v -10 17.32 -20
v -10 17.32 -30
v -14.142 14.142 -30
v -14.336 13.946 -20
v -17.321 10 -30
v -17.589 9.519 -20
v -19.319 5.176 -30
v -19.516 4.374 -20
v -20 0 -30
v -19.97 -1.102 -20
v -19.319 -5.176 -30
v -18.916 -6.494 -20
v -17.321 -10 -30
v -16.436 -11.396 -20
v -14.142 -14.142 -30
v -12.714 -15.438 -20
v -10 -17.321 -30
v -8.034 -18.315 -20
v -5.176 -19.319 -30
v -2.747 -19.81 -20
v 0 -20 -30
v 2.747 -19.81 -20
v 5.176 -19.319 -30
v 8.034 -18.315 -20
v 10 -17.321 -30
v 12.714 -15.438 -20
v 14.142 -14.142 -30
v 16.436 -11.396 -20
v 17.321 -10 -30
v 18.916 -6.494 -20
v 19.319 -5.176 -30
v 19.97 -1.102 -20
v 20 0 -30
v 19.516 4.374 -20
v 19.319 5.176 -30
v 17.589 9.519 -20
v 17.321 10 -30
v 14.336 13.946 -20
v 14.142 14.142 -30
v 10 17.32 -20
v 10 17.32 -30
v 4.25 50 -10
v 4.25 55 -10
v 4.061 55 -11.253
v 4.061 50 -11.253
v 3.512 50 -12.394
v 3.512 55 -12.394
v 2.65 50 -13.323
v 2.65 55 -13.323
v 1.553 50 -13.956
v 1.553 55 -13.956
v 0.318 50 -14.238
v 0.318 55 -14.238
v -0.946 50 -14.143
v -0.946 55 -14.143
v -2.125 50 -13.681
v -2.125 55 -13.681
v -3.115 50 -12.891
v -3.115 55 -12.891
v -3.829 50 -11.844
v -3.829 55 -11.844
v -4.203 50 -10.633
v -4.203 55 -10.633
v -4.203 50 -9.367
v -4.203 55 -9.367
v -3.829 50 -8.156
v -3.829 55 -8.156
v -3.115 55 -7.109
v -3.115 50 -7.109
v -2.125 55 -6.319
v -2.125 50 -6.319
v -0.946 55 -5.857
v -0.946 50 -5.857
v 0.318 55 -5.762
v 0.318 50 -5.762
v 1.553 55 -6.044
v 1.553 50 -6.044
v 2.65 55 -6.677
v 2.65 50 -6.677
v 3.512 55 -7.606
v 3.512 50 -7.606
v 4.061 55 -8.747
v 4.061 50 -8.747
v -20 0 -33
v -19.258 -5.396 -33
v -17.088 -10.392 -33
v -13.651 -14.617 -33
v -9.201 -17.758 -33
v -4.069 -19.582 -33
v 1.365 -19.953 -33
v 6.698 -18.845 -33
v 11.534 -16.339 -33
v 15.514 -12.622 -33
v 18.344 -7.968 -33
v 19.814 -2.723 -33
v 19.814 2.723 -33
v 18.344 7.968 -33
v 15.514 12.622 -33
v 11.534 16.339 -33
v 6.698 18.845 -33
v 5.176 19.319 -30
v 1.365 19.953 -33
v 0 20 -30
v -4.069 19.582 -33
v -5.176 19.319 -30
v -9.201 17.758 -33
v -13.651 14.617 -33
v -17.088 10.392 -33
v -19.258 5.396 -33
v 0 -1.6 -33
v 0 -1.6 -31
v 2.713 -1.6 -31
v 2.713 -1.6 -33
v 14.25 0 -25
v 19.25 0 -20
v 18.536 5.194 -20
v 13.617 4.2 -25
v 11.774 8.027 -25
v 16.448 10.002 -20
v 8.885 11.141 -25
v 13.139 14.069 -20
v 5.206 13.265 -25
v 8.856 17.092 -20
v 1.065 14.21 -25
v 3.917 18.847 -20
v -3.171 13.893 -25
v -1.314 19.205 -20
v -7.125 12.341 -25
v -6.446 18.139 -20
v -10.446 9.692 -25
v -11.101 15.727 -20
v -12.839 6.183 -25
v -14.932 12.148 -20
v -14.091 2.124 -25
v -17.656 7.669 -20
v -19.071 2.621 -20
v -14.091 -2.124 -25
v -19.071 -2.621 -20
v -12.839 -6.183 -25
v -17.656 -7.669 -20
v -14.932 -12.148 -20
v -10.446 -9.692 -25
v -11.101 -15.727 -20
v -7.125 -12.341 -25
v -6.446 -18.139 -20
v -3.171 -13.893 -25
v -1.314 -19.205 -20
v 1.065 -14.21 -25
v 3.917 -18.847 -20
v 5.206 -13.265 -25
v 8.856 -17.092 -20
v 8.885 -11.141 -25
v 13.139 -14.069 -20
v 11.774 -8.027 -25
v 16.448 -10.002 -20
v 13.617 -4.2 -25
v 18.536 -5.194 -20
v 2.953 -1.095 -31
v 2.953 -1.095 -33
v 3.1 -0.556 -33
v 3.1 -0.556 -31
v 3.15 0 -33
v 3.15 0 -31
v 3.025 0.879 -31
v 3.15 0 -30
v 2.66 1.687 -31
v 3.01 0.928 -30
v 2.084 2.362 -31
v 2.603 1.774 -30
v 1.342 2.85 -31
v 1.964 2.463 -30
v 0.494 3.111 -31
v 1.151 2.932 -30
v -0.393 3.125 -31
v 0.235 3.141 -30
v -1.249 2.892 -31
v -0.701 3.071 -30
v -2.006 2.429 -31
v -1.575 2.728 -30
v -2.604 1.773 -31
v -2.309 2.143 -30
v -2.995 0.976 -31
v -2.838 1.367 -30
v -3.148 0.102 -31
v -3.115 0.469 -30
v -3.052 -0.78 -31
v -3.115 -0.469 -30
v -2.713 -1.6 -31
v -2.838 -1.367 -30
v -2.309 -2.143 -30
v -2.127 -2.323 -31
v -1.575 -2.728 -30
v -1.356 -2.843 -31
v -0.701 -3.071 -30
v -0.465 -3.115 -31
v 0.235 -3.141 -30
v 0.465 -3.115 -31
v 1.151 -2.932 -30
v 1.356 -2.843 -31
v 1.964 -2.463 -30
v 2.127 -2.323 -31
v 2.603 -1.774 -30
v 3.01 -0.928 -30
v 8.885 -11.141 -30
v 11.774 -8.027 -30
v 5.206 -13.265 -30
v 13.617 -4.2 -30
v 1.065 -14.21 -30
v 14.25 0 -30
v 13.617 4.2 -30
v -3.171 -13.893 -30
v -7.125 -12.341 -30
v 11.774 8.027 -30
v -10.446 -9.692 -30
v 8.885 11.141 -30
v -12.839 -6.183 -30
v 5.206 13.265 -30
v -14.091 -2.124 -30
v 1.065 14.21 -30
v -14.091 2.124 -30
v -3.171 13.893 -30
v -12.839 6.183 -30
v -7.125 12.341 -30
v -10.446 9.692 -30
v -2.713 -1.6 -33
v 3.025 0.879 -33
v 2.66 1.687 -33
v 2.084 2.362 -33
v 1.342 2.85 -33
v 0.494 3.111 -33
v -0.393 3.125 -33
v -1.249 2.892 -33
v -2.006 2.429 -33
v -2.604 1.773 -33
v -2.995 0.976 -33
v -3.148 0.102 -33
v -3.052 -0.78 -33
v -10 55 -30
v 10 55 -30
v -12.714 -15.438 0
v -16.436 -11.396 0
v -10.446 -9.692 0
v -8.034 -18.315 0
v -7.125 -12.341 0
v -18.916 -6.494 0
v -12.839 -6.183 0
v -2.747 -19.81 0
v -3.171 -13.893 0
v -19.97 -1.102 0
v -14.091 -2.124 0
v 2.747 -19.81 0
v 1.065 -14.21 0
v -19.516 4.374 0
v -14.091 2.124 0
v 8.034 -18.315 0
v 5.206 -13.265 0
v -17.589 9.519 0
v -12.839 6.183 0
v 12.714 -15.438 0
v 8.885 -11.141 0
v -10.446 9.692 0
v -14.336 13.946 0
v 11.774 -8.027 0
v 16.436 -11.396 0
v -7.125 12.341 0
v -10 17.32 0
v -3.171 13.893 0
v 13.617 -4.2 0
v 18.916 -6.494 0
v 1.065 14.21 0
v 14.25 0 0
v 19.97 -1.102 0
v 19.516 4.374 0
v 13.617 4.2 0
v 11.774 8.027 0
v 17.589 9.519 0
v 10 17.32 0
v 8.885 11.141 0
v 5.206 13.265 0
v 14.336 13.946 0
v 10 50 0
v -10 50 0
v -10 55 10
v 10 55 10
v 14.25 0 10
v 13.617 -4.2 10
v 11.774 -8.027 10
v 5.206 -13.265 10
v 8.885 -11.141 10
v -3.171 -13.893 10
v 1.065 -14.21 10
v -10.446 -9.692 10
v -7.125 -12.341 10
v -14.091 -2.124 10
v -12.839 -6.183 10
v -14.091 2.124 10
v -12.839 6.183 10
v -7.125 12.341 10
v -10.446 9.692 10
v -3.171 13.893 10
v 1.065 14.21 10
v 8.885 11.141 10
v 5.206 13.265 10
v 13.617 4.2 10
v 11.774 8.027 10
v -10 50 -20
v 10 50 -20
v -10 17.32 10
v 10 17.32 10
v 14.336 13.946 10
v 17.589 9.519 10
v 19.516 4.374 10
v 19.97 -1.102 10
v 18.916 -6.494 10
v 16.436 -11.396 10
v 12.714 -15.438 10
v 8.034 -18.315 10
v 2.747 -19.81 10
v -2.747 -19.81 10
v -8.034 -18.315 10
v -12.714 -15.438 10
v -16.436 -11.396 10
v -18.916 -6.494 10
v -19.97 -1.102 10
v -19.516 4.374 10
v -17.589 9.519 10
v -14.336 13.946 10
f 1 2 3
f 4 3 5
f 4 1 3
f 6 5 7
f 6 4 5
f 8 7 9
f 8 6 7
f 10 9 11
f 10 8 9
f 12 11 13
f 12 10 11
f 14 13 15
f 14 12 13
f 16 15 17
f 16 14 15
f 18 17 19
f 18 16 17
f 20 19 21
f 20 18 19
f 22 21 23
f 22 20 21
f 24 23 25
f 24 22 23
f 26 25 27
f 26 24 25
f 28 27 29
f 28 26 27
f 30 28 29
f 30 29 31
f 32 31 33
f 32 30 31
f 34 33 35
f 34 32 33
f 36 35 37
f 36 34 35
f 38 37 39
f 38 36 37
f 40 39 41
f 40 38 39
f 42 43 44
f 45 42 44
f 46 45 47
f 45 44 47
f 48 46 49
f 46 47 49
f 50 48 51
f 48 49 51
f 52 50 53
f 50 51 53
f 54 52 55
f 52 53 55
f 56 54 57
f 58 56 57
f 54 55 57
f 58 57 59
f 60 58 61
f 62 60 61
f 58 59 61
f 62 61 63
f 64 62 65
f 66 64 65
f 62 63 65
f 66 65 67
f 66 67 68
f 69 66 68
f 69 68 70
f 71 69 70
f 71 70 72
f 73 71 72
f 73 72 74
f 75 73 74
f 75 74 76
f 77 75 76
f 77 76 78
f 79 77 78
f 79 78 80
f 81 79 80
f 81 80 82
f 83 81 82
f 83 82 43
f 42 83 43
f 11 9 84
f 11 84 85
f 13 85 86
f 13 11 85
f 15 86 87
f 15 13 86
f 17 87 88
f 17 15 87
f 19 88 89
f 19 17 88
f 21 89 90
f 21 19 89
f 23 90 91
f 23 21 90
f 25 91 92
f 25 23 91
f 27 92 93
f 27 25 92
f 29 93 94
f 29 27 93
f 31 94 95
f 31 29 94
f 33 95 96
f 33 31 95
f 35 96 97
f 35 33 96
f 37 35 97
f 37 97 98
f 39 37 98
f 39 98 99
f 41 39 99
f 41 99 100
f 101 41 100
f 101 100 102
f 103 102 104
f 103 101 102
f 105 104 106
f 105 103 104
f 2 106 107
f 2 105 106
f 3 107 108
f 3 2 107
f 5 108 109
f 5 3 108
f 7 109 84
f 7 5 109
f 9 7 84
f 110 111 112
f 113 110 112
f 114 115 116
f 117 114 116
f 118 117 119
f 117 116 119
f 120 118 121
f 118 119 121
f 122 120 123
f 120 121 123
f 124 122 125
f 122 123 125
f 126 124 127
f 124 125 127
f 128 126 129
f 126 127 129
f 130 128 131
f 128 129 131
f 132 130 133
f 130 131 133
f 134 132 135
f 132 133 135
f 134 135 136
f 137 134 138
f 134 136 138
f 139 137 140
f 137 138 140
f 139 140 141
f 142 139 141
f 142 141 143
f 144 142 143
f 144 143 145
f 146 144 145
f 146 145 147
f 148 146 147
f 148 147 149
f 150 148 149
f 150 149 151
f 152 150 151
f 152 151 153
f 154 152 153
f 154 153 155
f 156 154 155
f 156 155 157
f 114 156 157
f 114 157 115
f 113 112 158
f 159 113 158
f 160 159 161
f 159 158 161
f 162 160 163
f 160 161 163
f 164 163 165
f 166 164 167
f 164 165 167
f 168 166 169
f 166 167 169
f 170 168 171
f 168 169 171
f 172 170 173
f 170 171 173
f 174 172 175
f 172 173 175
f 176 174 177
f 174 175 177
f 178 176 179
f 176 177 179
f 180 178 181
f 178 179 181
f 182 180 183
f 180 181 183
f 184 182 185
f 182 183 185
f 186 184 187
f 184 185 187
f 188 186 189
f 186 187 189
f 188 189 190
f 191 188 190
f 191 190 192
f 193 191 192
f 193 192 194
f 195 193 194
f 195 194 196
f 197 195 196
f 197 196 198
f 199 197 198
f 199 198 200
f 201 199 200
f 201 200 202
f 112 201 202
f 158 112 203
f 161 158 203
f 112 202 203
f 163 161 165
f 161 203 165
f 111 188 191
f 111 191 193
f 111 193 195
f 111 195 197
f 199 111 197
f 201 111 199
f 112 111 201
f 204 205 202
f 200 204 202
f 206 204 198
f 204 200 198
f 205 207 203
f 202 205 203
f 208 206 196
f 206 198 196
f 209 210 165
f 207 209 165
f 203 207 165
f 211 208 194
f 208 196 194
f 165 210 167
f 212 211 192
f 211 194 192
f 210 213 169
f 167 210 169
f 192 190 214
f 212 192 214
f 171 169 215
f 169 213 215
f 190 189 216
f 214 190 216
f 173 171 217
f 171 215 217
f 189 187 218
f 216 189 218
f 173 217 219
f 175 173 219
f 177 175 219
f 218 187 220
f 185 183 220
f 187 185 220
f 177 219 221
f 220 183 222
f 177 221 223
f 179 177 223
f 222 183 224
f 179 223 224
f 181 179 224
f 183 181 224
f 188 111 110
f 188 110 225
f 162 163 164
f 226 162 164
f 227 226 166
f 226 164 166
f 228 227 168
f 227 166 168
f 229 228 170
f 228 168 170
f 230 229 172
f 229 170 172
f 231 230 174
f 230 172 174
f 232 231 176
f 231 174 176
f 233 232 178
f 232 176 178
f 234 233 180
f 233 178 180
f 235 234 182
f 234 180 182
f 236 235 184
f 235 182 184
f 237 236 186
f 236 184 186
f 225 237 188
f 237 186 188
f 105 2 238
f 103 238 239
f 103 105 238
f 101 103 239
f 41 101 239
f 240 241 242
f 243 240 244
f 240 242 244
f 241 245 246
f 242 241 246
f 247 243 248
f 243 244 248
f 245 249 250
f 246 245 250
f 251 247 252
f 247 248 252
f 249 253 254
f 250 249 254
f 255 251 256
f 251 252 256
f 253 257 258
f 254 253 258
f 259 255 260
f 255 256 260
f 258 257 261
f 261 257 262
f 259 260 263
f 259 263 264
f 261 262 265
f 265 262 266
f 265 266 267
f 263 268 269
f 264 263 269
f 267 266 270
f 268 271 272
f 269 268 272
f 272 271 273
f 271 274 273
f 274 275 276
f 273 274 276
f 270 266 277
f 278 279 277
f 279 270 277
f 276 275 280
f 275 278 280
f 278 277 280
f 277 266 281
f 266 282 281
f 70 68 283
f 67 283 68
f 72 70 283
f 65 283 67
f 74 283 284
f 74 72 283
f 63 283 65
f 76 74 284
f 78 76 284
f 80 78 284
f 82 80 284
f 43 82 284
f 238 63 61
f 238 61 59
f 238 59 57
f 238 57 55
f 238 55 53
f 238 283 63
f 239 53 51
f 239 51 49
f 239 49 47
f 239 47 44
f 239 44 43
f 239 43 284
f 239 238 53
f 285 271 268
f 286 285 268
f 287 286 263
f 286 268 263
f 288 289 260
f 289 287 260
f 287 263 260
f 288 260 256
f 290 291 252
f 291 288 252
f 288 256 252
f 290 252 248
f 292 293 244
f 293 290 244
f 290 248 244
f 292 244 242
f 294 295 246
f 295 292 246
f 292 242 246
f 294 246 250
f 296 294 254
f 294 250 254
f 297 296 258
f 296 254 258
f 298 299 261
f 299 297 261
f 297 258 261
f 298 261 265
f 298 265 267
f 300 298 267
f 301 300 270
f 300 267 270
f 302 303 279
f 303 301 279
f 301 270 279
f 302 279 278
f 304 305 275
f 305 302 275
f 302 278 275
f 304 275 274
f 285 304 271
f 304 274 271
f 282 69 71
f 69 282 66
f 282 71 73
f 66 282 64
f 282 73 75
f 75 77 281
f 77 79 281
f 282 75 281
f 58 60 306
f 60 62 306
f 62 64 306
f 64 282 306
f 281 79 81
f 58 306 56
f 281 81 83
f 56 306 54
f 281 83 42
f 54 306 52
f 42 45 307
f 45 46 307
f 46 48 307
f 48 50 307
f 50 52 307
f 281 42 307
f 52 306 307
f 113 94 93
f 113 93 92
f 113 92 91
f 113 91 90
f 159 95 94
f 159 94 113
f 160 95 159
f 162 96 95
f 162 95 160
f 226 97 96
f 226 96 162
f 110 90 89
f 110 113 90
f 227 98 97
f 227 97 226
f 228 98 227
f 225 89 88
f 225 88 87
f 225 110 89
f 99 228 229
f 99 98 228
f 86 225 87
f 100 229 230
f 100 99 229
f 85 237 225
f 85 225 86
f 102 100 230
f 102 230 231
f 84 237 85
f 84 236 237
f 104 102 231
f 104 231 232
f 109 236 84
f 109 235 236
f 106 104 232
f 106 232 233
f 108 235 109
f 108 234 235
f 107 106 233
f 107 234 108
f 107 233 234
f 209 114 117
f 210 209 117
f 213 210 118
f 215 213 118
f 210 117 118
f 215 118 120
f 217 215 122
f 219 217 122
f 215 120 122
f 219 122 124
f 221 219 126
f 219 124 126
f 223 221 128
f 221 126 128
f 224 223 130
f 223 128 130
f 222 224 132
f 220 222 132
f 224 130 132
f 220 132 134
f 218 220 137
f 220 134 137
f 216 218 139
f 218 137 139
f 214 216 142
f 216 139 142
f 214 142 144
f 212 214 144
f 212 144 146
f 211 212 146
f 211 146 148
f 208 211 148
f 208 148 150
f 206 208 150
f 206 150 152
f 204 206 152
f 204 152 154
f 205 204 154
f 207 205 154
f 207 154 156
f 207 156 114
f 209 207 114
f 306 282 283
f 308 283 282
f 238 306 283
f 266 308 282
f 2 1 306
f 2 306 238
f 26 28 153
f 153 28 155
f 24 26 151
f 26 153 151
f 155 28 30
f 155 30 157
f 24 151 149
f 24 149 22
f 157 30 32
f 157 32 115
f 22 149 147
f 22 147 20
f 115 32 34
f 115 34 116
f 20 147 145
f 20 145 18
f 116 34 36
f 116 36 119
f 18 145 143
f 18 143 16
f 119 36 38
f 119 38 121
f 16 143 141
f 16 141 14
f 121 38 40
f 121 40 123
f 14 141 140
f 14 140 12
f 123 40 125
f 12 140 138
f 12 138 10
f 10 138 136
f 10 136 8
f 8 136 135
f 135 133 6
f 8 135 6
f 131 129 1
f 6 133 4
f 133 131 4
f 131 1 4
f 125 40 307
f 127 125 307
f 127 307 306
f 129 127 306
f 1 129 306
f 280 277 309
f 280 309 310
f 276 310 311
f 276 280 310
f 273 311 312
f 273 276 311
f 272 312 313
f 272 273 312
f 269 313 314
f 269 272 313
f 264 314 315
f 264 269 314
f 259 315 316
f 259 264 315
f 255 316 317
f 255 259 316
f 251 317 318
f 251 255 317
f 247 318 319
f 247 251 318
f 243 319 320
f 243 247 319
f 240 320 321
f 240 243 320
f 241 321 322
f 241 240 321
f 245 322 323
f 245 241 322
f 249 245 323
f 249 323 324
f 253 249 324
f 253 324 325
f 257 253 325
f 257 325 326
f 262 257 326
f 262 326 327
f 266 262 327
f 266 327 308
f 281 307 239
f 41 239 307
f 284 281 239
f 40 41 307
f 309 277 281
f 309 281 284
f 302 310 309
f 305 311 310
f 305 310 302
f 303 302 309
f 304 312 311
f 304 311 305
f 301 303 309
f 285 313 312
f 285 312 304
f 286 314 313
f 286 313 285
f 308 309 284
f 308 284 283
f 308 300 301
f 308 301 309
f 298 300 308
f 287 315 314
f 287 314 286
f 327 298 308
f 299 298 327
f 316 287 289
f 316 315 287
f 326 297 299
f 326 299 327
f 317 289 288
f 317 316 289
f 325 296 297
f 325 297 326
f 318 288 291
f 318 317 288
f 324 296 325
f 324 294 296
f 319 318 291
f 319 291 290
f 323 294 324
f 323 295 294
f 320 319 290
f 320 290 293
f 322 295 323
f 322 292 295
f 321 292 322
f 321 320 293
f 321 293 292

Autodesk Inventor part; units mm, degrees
ref_plane "YZ Plane" through (0, 0, 0) normal (1, 0, 0) x (0, 1, 0)
ref_plane "XZ Plane" through (0, 0, 0) normal (0, 1, 0) x (-1, 0, 0)
ref_plane "XY Plane" through (0, 0, 0) normal (0, 0, 1) x (1, 0, 0)
sketch "Sketch1" plane through (0, 0, 0) normal (0, 0, 1) x (1, 0, 0)
  circle A0 centre (0, 0) radius 14.25
  circle A1 centre (0, 0) radius 20
  line L0 (0, 50) -> (10, 50)
  line L1 (10, 50) -> (10, 17.3205)
  line L2 (0, 20) -> (0, 50)
  line L3 (0, 50) -> (-10, 50)
  line L4 (-10, 50) -> (-10, 17.3205)
  point P0 (-20, 0)
  point P1 (20, 0)
  dimension "d0" = 28.5
  dimension "d1" = 40
  dimension "d25" = 10
  dimension "d31" = 10
extrude "Extrusion1" add sketch "Sketch1" along normal blind 10
ref_plane "Work Plane1" through (0, 0, -10) normal (0, 0, 1) x (1, 0, 0)
mirror "Mirror1" about plane through (0, 0, -10) normal (0, 0, 1) of "Extrusion1"
sketch "Sketch2" plane through (0, 0, -30) normal (0, 0, -1) x (-1, 0, 0)
  circle A0 centre (0, 0) radius 14.25 projected
  circle A1 centre (0, 0) radius 20
  dimension "d11" = 40
extrude "Extrusion2" add sketch "Sketch2" along normal blind 3 contours A0 | A1
sketch "Sketch3" plane through (0, 0, -30) normal (0, 0, 1) x (1, 0, 0)
  circle A0 centre (0, 0) radius 3.15
  dimension "d14" = 6.3
extrude "Extrusion3" cut sketch "Sketch3" against normal blind 1
sketch "Sketch4" plane through (0, 0, -31) normal (0, 0, 1) x (1, 0, 0)
  circle A0 centre (0, 0) radius 3.15
  line L0 (0, 0) -> (0, -1.6)
  line L1 (0, -1.6) -> (-2.7134, -1.6)
  line L2 (0, -1.6) -> (2.7134, -1.6)
  dimension "d17" = 6.3
  dimension "d18" = 1.6
extrude "Extrusion4" cut sketch "Sketch4" against normal through all contours A0 L2 L1 picked at (-0.0447, 1.5505)
sketch "Sketch6" plane through (-7.5, 50, -22) normal (0, 1, 0) x (1, 0, 0)
  line L0 (17.5, 8) -> (17.5, 8) projected
  line L1 (17.5, -22) -> (17.5, -32) projected
  line L2 (-2.5, 8) -> (17.5, 8)
  line L3 (17.5, 8) -> (17.5, -32)
  line L4 (17.5, -32) -> (-2.5, -32)
  line L5 (-2.5, -32) -> (-2.5, 8)
  point P0 (7.5, -22)
extrude "Extrusion6" add sketch "Sketch6" along normal blind 5
sketch "Sketch7" plane through (-7.5, 55, -22) normal (0, 1, 0) x (1, 0, 0)
  line L0 (21.75, -32) -> (-6.75, -32) projected
  line L1 (7.5, -32) -> (7.5, 8)
  line L2 (10.65, 8) -> (4.35, 8) projected
  circle A0 centre (7.5, -12) radius 4.25
  point P0 (7.5, -22)
  dimension "d28" = 8.5
extrude "Extrusion7" cut sketch "Sketch7" against normal up to next
chamfer "Chamfer1" distance 5 angle 45 1 edges at (-14.25, 0, -20)
equation "\"d4\" = d25"
equation "\"BendRadius\" = Thickness"
equation "\"BendReliefWidth\" = Thickness"
equation "\"BendReliefDepth\" = 0.5 * Thickness"
equation "\"CornerReliefSize\" = 4 * Thickness"
equation "\"MinimumRemnant\" = 2 * Thickness"
equation "\"TransitionRadius\" = BendRadius"
equation "\"JacobiRadiusSize\" = BendRadius"
equation "\"GapSize\" = Thickness"
equation "\"Thickness\" = 0.5"
properties part number "baseRotor1"
